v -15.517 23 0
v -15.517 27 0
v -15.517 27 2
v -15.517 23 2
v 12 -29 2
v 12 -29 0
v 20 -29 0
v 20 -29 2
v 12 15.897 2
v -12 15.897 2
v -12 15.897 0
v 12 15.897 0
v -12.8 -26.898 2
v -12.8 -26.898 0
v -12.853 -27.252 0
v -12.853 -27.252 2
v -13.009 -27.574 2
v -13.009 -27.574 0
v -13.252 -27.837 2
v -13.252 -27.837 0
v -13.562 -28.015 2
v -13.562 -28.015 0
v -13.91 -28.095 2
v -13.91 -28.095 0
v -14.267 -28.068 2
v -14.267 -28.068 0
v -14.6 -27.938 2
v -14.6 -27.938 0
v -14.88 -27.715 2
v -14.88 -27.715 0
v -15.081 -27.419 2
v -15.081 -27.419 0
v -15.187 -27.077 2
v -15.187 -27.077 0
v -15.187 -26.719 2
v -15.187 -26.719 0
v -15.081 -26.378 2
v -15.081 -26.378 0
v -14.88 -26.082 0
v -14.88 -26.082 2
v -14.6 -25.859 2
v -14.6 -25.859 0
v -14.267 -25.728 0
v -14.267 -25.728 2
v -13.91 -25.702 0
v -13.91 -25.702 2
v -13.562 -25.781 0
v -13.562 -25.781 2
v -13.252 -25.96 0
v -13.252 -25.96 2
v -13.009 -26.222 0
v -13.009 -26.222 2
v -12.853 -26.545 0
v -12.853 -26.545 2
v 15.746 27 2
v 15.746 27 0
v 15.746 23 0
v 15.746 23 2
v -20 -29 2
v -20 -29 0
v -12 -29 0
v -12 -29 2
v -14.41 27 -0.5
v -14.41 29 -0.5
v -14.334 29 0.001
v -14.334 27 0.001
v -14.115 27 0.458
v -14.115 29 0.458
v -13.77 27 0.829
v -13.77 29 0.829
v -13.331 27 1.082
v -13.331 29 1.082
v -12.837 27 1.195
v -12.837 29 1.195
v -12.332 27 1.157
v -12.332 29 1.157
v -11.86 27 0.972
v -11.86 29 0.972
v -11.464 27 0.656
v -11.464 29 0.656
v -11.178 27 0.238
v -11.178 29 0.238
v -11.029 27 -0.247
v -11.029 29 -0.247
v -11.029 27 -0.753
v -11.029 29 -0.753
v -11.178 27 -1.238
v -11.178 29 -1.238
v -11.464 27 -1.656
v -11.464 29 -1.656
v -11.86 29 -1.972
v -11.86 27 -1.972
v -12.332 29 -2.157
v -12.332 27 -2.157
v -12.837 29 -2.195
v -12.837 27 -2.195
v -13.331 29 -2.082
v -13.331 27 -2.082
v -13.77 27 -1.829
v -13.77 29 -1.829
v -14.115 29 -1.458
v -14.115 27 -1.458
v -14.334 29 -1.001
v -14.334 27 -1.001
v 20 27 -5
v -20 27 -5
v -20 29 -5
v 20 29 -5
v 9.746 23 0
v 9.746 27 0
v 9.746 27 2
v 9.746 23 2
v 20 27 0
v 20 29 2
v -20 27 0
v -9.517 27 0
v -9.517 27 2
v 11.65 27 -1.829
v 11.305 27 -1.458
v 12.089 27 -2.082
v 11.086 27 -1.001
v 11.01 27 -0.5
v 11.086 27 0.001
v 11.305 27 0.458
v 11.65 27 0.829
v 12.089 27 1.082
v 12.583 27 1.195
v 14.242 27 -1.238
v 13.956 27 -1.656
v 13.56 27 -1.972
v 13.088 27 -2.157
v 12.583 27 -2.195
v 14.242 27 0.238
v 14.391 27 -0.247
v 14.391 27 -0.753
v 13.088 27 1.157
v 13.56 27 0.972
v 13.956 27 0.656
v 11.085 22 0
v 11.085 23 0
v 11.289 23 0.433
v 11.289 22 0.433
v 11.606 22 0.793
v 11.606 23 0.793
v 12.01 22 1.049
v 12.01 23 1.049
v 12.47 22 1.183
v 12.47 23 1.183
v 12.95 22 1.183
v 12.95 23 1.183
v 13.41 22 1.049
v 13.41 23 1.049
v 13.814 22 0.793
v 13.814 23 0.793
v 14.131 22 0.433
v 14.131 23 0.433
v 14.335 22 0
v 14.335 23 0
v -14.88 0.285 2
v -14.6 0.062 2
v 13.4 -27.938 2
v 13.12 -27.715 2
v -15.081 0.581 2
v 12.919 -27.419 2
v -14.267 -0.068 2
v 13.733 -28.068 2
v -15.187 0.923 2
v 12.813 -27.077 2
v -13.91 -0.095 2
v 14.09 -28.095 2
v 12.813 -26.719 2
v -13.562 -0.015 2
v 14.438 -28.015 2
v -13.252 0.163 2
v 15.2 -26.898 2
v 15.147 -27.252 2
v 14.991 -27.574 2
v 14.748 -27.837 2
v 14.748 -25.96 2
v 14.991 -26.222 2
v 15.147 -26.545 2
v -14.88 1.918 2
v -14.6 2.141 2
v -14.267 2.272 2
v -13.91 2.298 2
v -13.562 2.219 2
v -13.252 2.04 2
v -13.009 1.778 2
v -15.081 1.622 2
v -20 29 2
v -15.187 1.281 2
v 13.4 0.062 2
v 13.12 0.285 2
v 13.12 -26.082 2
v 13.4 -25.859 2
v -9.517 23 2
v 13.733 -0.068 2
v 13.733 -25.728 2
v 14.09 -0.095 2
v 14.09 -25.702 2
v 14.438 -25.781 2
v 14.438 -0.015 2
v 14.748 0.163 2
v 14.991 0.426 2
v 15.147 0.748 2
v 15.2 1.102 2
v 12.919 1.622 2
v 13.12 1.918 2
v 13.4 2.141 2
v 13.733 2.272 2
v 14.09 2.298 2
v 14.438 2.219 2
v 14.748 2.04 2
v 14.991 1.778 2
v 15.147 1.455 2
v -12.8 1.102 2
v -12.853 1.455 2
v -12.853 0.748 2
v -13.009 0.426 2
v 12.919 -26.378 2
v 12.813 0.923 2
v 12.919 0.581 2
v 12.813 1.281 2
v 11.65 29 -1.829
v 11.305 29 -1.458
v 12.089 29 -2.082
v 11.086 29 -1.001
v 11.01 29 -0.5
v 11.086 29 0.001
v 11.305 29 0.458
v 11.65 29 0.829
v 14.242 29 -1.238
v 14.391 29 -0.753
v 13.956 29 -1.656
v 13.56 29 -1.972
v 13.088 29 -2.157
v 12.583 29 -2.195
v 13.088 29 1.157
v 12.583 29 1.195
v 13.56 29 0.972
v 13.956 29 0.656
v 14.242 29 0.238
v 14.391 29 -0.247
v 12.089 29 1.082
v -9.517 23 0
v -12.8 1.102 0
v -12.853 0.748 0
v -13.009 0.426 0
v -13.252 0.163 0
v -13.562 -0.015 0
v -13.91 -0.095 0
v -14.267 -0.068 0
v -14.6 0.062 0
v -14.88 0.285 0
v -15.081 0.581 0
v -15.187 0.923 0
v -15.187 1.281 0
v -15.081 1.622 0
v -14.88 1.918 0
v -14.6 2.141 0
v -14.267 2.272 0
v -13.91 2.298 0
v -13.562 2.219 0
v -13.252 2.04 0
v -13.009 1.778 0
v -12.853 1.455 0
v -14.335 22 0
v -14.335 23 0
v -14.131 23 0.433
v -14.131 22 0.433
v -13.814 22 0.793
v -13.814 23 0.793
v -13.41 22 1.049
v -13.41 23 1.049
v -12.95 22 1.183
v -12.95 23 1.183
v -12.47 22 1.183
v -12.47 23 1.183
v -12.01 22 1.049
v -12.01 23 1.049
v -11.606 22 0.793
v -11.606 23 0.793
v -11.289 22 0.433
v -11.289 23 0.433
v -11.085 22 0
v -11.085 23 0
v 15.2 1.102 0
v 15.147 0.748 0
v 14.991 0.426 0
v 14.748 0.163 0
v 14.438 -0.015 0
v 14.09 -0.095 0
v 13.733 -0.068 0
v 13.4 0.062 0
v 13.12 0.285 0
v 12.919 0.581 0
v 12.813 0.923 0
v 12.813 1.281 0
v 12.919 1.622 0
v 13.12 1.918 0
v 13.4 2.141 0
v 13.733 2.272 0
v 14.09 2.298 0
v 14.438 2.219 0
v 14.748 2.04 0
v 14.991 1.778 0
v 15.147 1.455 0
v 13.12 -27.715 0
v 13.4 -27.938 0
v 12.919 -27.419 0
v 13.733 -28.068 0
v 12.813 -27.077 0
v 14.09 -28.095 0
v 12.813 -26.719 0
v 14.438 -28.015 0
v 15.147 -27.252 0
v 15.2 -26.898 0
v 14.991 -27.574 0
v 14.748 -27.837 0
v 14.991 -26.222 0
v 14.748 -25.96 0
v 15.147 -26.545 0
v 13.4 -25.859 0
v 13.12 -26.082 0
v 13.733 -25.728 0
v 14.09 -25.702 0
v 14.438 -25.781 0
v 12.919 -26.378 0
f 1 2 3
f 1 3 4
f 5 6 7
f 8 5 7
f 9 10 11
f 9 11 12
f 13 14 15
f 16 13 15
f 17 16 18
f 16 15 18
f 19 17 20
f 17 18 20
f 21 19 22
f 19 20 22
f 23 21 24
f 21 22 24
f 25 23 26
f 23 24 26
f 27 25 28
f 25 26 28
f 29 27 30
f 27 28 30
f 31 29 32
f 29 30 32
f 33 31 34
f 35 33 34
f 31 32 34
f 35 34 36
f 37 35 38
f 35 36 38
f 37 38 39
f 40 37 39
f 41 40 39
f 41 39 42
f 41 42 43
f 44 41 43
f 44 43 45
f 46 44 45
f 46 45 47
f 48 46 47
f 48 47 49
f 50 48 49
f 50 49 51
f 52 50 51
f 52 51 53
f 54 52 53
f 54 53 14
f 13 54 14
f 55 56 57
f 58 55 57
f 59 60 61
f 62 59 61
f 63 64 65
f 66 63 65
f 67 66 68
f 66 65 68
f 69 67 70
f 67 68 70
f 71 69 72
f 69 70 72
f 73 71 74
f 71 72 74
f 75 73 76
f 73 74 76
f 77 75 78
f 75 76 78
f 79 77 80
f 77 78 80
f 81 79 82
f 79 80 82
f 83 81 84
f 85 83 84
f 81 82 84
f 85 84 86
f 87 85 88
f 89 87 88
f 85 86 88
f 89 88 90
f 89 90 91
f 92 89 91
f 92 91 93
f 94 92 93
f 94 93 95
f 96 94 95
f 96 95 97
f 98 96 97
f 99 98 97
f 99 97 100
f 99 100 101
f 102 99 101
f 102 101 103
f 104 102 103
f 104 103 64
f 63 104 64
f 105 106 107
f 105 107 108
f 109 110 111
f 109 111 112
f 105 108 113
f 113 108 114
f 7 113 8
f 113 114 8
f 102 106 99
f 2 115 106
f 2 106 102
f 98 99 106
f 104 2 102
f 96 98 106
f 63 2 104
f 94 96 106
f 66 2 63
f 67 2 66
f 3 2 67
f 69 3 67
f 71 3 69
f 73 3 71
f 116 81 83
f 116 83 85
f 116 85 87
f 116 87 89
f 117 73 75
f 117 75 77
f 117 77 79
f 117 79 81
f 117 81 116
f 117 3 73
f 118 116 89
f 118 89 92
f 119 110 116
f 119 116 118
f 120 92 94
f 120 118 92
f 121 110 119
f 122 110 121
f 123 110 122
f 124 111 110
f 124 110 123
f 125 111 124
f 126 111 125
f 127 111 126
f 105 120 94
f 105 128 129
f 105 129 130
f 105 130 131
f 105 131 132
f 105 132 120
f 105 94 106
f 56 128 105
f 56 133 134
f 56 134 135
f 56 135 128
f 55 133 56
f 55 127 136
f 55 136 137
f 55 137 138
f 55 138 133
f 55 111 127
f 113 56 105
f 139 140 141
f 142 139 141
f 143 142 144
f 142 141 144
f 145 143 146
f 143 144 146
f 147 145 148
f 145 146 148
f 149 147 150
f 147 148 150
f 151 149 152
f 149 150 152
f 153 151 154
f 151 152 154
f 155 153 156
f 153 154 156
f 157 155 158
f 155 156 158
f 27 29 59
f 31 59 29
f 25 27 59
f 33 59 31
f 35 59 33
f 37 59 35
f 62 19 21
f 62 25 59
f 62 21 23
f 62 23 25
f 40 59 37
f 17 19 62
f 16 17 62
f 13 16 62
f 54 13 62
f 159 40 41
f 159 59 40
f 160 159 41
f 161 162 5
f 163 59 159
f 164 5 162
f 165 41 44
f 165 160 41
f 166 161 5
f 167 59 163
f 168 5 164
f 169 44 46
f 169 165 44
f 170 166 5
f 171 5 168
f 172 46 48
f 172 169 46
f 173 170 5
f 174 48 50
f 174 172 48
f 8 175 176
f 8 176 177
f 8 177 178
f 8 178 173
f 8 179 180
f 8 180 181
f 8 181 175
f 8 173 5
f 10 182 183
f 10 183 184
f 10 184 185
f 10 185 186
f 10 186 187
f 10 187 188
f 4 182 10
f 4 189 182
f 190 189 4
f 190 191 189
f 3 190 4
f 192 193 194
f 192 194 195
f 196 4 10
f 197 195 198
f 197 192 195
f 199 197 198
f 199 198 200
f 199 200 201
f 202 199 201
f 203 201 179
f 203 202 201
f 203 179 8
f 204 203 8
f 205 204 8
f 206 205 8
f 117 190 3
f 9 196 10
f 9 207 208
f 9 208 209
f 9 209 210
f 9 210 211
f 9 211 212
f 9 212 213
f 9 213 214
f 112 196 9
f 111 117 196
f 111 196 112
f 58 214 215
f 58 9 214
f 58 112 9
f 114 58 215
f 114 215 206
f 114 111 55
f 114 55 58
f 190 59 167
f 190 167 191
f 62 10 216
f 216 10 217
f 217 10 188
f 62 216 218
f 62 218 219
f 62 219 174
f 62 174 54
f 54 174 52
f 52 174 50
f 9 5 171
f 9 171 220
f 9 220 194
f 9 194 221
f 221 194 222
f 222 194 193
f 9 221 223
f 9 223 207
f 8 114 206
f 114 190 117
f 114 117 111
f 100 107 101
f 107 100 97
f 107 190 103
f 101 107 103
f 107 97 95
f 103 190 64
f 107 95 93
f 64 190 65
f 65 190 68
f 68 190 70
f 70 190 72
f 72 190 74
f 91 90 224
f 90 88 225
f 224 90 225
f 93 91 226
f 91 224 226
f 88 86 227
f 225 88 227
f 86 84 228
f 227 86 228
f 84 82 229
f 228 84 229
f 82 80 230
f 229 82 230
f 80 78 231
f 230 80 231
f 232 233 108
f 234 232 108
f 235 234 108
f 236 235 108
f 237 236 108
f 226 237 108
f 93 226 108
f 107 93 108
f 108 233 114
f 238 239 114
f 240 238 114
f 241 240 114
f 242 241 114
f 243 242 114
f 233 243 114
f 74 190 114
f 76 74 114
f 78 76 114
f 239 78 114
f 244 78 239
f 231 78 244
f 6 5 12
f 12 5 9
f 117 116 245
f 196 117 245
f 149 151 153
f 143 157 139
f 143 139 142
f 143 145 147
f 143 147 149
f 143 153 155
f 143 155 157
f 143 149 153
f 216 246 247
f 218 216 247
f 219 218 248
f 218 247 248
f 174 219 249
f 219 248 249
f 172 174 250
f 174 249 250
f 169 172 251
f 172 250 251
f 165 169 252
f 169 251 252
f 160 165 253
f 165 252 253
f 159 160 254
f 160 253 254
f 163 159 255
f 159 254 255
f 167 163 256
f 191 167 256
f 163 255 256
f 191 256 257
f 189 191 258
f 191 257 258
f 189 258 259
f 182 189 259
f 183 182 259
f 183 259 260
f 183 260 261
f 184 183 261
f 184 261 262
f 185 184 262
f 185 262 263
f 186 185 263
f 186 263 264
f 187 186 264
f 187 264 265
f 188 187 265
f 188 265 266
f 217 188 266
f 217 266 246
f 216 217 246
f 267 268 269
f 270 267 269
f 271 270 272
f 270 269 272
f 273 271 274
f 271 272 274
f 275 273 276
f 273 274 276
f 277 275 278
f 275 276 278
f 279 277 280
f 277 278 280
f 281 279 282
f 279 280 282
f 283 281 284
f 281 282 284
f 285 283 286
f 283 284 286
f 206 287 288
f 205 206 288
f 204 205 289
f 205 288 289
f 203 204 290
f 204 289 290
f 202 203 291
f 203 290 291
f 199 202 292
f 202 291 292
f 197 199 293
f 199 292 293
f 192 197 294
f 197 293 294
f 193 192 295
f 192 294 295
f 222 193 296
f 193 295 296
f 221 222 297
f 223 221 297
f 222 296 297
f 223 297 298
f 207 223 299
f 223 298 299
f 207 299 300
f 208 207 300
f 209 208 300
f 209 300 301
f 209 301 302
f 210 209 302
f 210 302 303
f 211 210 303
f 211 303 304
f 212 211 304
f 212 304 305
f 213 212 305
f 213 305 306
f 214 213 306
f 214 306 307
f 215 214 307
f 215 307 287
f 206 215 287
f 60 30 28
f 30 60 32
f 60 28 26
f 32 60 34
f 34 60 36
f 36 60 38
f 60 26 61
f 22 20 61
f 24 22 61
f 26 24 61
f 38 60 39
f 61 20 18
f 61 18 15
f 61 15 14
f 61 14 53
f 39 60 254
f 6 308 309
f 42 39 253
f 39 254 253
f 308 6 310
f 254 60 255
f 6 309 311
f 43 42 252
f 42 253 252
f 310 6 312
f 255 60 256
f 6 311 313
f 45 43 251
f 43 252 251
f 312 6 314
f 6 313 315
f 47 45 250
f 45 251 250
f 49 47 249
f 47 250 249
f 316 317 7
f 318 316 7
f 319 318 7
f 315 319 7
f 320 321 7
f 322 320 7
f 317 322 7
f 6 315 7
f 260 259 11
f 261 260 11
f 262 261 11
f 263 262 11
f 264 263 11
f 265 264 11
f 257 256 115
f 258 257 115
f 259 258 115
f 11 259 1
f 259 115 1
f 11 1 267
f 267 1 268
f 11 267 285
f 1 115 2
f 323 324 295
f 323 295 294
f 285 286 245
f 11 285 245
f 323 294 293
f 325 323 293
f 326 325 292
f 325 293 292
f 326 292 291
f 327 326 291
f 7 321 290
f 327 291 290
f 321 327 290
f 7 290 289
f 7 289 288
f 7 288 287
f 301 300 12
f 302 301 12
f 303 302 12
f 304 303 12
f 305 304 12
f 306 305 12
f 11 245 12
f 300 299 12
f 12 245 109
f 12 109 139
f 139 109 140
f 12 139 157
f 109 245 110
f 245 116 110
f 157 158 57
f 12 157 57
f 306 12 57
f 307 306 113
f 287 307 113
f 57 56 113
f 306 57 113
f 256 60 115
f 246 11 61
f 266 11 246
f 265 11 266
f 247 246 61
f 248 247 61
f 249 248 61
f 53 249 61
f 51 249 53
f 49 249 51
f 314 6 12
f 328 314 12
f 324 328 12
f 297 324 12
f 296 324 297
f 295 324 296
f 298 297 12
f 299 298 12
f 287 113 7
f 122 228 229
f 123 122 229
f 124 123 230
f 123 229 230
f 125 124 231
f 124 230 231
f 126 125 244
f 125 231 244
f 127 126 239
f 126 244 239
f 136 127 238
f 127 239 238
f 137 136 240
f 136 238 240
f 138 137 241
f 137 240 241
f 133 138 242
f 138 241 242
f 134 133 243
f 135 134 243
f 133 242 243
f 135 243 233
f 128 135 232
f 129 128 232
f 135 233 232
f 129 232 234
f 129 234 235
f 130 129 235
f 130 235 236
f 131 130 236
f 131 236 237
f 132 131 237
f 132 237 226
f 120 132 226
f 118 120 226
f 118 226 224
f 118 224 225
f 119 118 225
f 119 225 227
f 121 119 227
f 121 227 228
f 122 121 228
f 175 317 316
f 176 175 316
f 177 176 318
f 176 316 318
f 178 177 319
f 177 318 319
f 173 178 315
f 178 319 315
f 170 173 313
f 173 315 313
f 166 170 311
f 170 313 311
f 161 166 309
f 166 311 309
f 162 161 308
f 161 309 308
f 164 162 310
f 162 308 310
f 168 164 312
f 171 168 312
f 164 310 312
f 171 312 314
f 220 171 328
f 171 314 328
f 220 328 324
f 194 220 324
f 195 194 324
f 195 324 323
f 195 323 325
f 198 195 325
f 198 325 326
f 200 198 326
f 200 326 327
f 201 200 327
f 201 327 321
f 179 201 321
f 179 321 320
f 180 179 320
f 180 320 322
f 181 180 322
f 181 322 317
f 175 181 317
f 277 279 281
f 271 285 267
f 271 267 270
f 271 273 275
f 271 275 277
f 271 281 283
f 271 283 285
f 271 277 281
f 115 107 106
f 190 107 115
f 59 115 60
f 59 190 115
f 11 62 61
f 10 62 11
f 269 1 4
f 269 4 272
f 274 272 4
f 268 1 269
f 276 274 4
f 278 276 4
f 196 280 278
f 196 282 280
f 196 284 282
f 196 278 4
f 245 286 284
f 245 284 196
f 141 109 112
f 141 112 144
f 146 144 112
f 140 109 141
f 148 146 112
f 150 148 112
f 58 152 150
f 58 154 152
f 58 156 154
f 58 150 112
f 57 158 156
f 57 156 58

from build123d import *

# Parameters (mm, degrees)
SKETCH_W        = 40
SKETCH_H        = 58
PAD_DEPTH       = 2
SKETCH001_W     = 24
SKETCH001_H     = 50
POCKET_DEPTH    = 5
SKETCH002_W     = 40
SKETCH002_H     = 2
PAD001_DEPTH    = 5
SKETCH004_R     = 1.7
POCKET001_DEPTH = 7
SKETCH005_R     = 1.2
POCKET002_DEPTH = 5
SKETCH006_W     = 6
SKETCH006_H     = 4
POCKET003_DEPTH = 5
SKETCH007_R     = 1.2
POCKET004_DEPTH = 5


with BuildPart() as part:
    # Sketch → Pad (new body)
    with BuildSketch(Plane.XY):
        Rectangle(SKETCH_W, SKETCH_H)
    extrude(amount=PAD_DEPTH)

    # Sketch001 (on Face6 of Pad) → Pocket (cut)
    with BuildSketch(Plane.XY.offset(2)):
        with Locations((0, -9.102527)):
            Rectangle(SKETCH001_W, SKETCH001_H)
    extrude(amount=-POCKET_DEPTH, mode=Mode.SUBTRACT)

    # Sketch002 (on Face4 of Pocket) → Pad001 (join)
    with BuildSketch(Plane(origin=(0, 0, 0), x_dir=(1, 0, 0), z_dir=(0, 0, -1))):
        with Locations((0, -28)):
            Rectangle(SKETCH002_W, SKETCH002_H)
    extrude(amount=PAD001_DEPTH)

    # Sketch004 (on Face4 of Pad001) → Pocket001 (cut)
    with BuildSketch(Plane(origin=(0, 29, 0), x_dir=(-1, 0, 0), z_dir=(0, 1, 0))):
        with Locations((-12.71, -0.5)):
            Circle(SKETCH004_R)
        with Locations((12.71, -0.5)):
            Circle(SKETCH004_R)
    extrude(amount=-POCKET001_DEPTH, mode=Mode.SUBTRACT)

    # Sketch005 (on Face5 of Pocket001) → Pocket002 (cut)
    with BuildSketch(Plane.YZ.offset(20)):
        with Locations((-14, 25)):
            Circle(SKETCH005_R)
        with Locations((14, 25)):
            Circle(SKETCH005_R)
        with Locations((14, -3)):
            Circle(SKETCH005_R)
        with Locations((-14, -3)):
            Circle(SKETCH005_R)
    extrude(amount=-POCKET002_DEPTH, mode=Mode.SUBTRACT)

    # Sketch006 (on Face12 of Pocket002) → Pocket003 (cut)
    with BuildSketch(Plane(origin=(0, 0, 0), x_dir=(1, 0, 0), z_dir=(0, 0, -1))):
        with Locations((-12.517092, -25)):
            Rectangle(SKETCH006_W, SKETCH006_H)
        with Locations((12.746344, -25)):
            Rectangle(SKETCH006_W, SKETCH006_H)
    extrude(amount=-POCKET003_DEPTH, mode=Mode.SUBTRACT)

    # Sketch007 (on Face15 of Pocket003) → Pocket004 (cut)
    with BuildSketch(Plane(origin=(0, 0, 0), x_dir=(1, 0, 0), z_dir=(0, 0, -1))):
        with Locations((-14, 26.898312)):
            Circle(SKETCH007_R)
        with Locations((14, 26.898312)):
            Circle(SKETCH007_R)
        with Locations((14, -1.101688)):
            Circle(SKETCH007_R)
        with Locations((-14, -1.101688)):
            Circle(SKETCH007_R)
    extrude(amount=-POCKET004_DEPTH, mode=Mode.SUBTRACT)


solid = part.part
